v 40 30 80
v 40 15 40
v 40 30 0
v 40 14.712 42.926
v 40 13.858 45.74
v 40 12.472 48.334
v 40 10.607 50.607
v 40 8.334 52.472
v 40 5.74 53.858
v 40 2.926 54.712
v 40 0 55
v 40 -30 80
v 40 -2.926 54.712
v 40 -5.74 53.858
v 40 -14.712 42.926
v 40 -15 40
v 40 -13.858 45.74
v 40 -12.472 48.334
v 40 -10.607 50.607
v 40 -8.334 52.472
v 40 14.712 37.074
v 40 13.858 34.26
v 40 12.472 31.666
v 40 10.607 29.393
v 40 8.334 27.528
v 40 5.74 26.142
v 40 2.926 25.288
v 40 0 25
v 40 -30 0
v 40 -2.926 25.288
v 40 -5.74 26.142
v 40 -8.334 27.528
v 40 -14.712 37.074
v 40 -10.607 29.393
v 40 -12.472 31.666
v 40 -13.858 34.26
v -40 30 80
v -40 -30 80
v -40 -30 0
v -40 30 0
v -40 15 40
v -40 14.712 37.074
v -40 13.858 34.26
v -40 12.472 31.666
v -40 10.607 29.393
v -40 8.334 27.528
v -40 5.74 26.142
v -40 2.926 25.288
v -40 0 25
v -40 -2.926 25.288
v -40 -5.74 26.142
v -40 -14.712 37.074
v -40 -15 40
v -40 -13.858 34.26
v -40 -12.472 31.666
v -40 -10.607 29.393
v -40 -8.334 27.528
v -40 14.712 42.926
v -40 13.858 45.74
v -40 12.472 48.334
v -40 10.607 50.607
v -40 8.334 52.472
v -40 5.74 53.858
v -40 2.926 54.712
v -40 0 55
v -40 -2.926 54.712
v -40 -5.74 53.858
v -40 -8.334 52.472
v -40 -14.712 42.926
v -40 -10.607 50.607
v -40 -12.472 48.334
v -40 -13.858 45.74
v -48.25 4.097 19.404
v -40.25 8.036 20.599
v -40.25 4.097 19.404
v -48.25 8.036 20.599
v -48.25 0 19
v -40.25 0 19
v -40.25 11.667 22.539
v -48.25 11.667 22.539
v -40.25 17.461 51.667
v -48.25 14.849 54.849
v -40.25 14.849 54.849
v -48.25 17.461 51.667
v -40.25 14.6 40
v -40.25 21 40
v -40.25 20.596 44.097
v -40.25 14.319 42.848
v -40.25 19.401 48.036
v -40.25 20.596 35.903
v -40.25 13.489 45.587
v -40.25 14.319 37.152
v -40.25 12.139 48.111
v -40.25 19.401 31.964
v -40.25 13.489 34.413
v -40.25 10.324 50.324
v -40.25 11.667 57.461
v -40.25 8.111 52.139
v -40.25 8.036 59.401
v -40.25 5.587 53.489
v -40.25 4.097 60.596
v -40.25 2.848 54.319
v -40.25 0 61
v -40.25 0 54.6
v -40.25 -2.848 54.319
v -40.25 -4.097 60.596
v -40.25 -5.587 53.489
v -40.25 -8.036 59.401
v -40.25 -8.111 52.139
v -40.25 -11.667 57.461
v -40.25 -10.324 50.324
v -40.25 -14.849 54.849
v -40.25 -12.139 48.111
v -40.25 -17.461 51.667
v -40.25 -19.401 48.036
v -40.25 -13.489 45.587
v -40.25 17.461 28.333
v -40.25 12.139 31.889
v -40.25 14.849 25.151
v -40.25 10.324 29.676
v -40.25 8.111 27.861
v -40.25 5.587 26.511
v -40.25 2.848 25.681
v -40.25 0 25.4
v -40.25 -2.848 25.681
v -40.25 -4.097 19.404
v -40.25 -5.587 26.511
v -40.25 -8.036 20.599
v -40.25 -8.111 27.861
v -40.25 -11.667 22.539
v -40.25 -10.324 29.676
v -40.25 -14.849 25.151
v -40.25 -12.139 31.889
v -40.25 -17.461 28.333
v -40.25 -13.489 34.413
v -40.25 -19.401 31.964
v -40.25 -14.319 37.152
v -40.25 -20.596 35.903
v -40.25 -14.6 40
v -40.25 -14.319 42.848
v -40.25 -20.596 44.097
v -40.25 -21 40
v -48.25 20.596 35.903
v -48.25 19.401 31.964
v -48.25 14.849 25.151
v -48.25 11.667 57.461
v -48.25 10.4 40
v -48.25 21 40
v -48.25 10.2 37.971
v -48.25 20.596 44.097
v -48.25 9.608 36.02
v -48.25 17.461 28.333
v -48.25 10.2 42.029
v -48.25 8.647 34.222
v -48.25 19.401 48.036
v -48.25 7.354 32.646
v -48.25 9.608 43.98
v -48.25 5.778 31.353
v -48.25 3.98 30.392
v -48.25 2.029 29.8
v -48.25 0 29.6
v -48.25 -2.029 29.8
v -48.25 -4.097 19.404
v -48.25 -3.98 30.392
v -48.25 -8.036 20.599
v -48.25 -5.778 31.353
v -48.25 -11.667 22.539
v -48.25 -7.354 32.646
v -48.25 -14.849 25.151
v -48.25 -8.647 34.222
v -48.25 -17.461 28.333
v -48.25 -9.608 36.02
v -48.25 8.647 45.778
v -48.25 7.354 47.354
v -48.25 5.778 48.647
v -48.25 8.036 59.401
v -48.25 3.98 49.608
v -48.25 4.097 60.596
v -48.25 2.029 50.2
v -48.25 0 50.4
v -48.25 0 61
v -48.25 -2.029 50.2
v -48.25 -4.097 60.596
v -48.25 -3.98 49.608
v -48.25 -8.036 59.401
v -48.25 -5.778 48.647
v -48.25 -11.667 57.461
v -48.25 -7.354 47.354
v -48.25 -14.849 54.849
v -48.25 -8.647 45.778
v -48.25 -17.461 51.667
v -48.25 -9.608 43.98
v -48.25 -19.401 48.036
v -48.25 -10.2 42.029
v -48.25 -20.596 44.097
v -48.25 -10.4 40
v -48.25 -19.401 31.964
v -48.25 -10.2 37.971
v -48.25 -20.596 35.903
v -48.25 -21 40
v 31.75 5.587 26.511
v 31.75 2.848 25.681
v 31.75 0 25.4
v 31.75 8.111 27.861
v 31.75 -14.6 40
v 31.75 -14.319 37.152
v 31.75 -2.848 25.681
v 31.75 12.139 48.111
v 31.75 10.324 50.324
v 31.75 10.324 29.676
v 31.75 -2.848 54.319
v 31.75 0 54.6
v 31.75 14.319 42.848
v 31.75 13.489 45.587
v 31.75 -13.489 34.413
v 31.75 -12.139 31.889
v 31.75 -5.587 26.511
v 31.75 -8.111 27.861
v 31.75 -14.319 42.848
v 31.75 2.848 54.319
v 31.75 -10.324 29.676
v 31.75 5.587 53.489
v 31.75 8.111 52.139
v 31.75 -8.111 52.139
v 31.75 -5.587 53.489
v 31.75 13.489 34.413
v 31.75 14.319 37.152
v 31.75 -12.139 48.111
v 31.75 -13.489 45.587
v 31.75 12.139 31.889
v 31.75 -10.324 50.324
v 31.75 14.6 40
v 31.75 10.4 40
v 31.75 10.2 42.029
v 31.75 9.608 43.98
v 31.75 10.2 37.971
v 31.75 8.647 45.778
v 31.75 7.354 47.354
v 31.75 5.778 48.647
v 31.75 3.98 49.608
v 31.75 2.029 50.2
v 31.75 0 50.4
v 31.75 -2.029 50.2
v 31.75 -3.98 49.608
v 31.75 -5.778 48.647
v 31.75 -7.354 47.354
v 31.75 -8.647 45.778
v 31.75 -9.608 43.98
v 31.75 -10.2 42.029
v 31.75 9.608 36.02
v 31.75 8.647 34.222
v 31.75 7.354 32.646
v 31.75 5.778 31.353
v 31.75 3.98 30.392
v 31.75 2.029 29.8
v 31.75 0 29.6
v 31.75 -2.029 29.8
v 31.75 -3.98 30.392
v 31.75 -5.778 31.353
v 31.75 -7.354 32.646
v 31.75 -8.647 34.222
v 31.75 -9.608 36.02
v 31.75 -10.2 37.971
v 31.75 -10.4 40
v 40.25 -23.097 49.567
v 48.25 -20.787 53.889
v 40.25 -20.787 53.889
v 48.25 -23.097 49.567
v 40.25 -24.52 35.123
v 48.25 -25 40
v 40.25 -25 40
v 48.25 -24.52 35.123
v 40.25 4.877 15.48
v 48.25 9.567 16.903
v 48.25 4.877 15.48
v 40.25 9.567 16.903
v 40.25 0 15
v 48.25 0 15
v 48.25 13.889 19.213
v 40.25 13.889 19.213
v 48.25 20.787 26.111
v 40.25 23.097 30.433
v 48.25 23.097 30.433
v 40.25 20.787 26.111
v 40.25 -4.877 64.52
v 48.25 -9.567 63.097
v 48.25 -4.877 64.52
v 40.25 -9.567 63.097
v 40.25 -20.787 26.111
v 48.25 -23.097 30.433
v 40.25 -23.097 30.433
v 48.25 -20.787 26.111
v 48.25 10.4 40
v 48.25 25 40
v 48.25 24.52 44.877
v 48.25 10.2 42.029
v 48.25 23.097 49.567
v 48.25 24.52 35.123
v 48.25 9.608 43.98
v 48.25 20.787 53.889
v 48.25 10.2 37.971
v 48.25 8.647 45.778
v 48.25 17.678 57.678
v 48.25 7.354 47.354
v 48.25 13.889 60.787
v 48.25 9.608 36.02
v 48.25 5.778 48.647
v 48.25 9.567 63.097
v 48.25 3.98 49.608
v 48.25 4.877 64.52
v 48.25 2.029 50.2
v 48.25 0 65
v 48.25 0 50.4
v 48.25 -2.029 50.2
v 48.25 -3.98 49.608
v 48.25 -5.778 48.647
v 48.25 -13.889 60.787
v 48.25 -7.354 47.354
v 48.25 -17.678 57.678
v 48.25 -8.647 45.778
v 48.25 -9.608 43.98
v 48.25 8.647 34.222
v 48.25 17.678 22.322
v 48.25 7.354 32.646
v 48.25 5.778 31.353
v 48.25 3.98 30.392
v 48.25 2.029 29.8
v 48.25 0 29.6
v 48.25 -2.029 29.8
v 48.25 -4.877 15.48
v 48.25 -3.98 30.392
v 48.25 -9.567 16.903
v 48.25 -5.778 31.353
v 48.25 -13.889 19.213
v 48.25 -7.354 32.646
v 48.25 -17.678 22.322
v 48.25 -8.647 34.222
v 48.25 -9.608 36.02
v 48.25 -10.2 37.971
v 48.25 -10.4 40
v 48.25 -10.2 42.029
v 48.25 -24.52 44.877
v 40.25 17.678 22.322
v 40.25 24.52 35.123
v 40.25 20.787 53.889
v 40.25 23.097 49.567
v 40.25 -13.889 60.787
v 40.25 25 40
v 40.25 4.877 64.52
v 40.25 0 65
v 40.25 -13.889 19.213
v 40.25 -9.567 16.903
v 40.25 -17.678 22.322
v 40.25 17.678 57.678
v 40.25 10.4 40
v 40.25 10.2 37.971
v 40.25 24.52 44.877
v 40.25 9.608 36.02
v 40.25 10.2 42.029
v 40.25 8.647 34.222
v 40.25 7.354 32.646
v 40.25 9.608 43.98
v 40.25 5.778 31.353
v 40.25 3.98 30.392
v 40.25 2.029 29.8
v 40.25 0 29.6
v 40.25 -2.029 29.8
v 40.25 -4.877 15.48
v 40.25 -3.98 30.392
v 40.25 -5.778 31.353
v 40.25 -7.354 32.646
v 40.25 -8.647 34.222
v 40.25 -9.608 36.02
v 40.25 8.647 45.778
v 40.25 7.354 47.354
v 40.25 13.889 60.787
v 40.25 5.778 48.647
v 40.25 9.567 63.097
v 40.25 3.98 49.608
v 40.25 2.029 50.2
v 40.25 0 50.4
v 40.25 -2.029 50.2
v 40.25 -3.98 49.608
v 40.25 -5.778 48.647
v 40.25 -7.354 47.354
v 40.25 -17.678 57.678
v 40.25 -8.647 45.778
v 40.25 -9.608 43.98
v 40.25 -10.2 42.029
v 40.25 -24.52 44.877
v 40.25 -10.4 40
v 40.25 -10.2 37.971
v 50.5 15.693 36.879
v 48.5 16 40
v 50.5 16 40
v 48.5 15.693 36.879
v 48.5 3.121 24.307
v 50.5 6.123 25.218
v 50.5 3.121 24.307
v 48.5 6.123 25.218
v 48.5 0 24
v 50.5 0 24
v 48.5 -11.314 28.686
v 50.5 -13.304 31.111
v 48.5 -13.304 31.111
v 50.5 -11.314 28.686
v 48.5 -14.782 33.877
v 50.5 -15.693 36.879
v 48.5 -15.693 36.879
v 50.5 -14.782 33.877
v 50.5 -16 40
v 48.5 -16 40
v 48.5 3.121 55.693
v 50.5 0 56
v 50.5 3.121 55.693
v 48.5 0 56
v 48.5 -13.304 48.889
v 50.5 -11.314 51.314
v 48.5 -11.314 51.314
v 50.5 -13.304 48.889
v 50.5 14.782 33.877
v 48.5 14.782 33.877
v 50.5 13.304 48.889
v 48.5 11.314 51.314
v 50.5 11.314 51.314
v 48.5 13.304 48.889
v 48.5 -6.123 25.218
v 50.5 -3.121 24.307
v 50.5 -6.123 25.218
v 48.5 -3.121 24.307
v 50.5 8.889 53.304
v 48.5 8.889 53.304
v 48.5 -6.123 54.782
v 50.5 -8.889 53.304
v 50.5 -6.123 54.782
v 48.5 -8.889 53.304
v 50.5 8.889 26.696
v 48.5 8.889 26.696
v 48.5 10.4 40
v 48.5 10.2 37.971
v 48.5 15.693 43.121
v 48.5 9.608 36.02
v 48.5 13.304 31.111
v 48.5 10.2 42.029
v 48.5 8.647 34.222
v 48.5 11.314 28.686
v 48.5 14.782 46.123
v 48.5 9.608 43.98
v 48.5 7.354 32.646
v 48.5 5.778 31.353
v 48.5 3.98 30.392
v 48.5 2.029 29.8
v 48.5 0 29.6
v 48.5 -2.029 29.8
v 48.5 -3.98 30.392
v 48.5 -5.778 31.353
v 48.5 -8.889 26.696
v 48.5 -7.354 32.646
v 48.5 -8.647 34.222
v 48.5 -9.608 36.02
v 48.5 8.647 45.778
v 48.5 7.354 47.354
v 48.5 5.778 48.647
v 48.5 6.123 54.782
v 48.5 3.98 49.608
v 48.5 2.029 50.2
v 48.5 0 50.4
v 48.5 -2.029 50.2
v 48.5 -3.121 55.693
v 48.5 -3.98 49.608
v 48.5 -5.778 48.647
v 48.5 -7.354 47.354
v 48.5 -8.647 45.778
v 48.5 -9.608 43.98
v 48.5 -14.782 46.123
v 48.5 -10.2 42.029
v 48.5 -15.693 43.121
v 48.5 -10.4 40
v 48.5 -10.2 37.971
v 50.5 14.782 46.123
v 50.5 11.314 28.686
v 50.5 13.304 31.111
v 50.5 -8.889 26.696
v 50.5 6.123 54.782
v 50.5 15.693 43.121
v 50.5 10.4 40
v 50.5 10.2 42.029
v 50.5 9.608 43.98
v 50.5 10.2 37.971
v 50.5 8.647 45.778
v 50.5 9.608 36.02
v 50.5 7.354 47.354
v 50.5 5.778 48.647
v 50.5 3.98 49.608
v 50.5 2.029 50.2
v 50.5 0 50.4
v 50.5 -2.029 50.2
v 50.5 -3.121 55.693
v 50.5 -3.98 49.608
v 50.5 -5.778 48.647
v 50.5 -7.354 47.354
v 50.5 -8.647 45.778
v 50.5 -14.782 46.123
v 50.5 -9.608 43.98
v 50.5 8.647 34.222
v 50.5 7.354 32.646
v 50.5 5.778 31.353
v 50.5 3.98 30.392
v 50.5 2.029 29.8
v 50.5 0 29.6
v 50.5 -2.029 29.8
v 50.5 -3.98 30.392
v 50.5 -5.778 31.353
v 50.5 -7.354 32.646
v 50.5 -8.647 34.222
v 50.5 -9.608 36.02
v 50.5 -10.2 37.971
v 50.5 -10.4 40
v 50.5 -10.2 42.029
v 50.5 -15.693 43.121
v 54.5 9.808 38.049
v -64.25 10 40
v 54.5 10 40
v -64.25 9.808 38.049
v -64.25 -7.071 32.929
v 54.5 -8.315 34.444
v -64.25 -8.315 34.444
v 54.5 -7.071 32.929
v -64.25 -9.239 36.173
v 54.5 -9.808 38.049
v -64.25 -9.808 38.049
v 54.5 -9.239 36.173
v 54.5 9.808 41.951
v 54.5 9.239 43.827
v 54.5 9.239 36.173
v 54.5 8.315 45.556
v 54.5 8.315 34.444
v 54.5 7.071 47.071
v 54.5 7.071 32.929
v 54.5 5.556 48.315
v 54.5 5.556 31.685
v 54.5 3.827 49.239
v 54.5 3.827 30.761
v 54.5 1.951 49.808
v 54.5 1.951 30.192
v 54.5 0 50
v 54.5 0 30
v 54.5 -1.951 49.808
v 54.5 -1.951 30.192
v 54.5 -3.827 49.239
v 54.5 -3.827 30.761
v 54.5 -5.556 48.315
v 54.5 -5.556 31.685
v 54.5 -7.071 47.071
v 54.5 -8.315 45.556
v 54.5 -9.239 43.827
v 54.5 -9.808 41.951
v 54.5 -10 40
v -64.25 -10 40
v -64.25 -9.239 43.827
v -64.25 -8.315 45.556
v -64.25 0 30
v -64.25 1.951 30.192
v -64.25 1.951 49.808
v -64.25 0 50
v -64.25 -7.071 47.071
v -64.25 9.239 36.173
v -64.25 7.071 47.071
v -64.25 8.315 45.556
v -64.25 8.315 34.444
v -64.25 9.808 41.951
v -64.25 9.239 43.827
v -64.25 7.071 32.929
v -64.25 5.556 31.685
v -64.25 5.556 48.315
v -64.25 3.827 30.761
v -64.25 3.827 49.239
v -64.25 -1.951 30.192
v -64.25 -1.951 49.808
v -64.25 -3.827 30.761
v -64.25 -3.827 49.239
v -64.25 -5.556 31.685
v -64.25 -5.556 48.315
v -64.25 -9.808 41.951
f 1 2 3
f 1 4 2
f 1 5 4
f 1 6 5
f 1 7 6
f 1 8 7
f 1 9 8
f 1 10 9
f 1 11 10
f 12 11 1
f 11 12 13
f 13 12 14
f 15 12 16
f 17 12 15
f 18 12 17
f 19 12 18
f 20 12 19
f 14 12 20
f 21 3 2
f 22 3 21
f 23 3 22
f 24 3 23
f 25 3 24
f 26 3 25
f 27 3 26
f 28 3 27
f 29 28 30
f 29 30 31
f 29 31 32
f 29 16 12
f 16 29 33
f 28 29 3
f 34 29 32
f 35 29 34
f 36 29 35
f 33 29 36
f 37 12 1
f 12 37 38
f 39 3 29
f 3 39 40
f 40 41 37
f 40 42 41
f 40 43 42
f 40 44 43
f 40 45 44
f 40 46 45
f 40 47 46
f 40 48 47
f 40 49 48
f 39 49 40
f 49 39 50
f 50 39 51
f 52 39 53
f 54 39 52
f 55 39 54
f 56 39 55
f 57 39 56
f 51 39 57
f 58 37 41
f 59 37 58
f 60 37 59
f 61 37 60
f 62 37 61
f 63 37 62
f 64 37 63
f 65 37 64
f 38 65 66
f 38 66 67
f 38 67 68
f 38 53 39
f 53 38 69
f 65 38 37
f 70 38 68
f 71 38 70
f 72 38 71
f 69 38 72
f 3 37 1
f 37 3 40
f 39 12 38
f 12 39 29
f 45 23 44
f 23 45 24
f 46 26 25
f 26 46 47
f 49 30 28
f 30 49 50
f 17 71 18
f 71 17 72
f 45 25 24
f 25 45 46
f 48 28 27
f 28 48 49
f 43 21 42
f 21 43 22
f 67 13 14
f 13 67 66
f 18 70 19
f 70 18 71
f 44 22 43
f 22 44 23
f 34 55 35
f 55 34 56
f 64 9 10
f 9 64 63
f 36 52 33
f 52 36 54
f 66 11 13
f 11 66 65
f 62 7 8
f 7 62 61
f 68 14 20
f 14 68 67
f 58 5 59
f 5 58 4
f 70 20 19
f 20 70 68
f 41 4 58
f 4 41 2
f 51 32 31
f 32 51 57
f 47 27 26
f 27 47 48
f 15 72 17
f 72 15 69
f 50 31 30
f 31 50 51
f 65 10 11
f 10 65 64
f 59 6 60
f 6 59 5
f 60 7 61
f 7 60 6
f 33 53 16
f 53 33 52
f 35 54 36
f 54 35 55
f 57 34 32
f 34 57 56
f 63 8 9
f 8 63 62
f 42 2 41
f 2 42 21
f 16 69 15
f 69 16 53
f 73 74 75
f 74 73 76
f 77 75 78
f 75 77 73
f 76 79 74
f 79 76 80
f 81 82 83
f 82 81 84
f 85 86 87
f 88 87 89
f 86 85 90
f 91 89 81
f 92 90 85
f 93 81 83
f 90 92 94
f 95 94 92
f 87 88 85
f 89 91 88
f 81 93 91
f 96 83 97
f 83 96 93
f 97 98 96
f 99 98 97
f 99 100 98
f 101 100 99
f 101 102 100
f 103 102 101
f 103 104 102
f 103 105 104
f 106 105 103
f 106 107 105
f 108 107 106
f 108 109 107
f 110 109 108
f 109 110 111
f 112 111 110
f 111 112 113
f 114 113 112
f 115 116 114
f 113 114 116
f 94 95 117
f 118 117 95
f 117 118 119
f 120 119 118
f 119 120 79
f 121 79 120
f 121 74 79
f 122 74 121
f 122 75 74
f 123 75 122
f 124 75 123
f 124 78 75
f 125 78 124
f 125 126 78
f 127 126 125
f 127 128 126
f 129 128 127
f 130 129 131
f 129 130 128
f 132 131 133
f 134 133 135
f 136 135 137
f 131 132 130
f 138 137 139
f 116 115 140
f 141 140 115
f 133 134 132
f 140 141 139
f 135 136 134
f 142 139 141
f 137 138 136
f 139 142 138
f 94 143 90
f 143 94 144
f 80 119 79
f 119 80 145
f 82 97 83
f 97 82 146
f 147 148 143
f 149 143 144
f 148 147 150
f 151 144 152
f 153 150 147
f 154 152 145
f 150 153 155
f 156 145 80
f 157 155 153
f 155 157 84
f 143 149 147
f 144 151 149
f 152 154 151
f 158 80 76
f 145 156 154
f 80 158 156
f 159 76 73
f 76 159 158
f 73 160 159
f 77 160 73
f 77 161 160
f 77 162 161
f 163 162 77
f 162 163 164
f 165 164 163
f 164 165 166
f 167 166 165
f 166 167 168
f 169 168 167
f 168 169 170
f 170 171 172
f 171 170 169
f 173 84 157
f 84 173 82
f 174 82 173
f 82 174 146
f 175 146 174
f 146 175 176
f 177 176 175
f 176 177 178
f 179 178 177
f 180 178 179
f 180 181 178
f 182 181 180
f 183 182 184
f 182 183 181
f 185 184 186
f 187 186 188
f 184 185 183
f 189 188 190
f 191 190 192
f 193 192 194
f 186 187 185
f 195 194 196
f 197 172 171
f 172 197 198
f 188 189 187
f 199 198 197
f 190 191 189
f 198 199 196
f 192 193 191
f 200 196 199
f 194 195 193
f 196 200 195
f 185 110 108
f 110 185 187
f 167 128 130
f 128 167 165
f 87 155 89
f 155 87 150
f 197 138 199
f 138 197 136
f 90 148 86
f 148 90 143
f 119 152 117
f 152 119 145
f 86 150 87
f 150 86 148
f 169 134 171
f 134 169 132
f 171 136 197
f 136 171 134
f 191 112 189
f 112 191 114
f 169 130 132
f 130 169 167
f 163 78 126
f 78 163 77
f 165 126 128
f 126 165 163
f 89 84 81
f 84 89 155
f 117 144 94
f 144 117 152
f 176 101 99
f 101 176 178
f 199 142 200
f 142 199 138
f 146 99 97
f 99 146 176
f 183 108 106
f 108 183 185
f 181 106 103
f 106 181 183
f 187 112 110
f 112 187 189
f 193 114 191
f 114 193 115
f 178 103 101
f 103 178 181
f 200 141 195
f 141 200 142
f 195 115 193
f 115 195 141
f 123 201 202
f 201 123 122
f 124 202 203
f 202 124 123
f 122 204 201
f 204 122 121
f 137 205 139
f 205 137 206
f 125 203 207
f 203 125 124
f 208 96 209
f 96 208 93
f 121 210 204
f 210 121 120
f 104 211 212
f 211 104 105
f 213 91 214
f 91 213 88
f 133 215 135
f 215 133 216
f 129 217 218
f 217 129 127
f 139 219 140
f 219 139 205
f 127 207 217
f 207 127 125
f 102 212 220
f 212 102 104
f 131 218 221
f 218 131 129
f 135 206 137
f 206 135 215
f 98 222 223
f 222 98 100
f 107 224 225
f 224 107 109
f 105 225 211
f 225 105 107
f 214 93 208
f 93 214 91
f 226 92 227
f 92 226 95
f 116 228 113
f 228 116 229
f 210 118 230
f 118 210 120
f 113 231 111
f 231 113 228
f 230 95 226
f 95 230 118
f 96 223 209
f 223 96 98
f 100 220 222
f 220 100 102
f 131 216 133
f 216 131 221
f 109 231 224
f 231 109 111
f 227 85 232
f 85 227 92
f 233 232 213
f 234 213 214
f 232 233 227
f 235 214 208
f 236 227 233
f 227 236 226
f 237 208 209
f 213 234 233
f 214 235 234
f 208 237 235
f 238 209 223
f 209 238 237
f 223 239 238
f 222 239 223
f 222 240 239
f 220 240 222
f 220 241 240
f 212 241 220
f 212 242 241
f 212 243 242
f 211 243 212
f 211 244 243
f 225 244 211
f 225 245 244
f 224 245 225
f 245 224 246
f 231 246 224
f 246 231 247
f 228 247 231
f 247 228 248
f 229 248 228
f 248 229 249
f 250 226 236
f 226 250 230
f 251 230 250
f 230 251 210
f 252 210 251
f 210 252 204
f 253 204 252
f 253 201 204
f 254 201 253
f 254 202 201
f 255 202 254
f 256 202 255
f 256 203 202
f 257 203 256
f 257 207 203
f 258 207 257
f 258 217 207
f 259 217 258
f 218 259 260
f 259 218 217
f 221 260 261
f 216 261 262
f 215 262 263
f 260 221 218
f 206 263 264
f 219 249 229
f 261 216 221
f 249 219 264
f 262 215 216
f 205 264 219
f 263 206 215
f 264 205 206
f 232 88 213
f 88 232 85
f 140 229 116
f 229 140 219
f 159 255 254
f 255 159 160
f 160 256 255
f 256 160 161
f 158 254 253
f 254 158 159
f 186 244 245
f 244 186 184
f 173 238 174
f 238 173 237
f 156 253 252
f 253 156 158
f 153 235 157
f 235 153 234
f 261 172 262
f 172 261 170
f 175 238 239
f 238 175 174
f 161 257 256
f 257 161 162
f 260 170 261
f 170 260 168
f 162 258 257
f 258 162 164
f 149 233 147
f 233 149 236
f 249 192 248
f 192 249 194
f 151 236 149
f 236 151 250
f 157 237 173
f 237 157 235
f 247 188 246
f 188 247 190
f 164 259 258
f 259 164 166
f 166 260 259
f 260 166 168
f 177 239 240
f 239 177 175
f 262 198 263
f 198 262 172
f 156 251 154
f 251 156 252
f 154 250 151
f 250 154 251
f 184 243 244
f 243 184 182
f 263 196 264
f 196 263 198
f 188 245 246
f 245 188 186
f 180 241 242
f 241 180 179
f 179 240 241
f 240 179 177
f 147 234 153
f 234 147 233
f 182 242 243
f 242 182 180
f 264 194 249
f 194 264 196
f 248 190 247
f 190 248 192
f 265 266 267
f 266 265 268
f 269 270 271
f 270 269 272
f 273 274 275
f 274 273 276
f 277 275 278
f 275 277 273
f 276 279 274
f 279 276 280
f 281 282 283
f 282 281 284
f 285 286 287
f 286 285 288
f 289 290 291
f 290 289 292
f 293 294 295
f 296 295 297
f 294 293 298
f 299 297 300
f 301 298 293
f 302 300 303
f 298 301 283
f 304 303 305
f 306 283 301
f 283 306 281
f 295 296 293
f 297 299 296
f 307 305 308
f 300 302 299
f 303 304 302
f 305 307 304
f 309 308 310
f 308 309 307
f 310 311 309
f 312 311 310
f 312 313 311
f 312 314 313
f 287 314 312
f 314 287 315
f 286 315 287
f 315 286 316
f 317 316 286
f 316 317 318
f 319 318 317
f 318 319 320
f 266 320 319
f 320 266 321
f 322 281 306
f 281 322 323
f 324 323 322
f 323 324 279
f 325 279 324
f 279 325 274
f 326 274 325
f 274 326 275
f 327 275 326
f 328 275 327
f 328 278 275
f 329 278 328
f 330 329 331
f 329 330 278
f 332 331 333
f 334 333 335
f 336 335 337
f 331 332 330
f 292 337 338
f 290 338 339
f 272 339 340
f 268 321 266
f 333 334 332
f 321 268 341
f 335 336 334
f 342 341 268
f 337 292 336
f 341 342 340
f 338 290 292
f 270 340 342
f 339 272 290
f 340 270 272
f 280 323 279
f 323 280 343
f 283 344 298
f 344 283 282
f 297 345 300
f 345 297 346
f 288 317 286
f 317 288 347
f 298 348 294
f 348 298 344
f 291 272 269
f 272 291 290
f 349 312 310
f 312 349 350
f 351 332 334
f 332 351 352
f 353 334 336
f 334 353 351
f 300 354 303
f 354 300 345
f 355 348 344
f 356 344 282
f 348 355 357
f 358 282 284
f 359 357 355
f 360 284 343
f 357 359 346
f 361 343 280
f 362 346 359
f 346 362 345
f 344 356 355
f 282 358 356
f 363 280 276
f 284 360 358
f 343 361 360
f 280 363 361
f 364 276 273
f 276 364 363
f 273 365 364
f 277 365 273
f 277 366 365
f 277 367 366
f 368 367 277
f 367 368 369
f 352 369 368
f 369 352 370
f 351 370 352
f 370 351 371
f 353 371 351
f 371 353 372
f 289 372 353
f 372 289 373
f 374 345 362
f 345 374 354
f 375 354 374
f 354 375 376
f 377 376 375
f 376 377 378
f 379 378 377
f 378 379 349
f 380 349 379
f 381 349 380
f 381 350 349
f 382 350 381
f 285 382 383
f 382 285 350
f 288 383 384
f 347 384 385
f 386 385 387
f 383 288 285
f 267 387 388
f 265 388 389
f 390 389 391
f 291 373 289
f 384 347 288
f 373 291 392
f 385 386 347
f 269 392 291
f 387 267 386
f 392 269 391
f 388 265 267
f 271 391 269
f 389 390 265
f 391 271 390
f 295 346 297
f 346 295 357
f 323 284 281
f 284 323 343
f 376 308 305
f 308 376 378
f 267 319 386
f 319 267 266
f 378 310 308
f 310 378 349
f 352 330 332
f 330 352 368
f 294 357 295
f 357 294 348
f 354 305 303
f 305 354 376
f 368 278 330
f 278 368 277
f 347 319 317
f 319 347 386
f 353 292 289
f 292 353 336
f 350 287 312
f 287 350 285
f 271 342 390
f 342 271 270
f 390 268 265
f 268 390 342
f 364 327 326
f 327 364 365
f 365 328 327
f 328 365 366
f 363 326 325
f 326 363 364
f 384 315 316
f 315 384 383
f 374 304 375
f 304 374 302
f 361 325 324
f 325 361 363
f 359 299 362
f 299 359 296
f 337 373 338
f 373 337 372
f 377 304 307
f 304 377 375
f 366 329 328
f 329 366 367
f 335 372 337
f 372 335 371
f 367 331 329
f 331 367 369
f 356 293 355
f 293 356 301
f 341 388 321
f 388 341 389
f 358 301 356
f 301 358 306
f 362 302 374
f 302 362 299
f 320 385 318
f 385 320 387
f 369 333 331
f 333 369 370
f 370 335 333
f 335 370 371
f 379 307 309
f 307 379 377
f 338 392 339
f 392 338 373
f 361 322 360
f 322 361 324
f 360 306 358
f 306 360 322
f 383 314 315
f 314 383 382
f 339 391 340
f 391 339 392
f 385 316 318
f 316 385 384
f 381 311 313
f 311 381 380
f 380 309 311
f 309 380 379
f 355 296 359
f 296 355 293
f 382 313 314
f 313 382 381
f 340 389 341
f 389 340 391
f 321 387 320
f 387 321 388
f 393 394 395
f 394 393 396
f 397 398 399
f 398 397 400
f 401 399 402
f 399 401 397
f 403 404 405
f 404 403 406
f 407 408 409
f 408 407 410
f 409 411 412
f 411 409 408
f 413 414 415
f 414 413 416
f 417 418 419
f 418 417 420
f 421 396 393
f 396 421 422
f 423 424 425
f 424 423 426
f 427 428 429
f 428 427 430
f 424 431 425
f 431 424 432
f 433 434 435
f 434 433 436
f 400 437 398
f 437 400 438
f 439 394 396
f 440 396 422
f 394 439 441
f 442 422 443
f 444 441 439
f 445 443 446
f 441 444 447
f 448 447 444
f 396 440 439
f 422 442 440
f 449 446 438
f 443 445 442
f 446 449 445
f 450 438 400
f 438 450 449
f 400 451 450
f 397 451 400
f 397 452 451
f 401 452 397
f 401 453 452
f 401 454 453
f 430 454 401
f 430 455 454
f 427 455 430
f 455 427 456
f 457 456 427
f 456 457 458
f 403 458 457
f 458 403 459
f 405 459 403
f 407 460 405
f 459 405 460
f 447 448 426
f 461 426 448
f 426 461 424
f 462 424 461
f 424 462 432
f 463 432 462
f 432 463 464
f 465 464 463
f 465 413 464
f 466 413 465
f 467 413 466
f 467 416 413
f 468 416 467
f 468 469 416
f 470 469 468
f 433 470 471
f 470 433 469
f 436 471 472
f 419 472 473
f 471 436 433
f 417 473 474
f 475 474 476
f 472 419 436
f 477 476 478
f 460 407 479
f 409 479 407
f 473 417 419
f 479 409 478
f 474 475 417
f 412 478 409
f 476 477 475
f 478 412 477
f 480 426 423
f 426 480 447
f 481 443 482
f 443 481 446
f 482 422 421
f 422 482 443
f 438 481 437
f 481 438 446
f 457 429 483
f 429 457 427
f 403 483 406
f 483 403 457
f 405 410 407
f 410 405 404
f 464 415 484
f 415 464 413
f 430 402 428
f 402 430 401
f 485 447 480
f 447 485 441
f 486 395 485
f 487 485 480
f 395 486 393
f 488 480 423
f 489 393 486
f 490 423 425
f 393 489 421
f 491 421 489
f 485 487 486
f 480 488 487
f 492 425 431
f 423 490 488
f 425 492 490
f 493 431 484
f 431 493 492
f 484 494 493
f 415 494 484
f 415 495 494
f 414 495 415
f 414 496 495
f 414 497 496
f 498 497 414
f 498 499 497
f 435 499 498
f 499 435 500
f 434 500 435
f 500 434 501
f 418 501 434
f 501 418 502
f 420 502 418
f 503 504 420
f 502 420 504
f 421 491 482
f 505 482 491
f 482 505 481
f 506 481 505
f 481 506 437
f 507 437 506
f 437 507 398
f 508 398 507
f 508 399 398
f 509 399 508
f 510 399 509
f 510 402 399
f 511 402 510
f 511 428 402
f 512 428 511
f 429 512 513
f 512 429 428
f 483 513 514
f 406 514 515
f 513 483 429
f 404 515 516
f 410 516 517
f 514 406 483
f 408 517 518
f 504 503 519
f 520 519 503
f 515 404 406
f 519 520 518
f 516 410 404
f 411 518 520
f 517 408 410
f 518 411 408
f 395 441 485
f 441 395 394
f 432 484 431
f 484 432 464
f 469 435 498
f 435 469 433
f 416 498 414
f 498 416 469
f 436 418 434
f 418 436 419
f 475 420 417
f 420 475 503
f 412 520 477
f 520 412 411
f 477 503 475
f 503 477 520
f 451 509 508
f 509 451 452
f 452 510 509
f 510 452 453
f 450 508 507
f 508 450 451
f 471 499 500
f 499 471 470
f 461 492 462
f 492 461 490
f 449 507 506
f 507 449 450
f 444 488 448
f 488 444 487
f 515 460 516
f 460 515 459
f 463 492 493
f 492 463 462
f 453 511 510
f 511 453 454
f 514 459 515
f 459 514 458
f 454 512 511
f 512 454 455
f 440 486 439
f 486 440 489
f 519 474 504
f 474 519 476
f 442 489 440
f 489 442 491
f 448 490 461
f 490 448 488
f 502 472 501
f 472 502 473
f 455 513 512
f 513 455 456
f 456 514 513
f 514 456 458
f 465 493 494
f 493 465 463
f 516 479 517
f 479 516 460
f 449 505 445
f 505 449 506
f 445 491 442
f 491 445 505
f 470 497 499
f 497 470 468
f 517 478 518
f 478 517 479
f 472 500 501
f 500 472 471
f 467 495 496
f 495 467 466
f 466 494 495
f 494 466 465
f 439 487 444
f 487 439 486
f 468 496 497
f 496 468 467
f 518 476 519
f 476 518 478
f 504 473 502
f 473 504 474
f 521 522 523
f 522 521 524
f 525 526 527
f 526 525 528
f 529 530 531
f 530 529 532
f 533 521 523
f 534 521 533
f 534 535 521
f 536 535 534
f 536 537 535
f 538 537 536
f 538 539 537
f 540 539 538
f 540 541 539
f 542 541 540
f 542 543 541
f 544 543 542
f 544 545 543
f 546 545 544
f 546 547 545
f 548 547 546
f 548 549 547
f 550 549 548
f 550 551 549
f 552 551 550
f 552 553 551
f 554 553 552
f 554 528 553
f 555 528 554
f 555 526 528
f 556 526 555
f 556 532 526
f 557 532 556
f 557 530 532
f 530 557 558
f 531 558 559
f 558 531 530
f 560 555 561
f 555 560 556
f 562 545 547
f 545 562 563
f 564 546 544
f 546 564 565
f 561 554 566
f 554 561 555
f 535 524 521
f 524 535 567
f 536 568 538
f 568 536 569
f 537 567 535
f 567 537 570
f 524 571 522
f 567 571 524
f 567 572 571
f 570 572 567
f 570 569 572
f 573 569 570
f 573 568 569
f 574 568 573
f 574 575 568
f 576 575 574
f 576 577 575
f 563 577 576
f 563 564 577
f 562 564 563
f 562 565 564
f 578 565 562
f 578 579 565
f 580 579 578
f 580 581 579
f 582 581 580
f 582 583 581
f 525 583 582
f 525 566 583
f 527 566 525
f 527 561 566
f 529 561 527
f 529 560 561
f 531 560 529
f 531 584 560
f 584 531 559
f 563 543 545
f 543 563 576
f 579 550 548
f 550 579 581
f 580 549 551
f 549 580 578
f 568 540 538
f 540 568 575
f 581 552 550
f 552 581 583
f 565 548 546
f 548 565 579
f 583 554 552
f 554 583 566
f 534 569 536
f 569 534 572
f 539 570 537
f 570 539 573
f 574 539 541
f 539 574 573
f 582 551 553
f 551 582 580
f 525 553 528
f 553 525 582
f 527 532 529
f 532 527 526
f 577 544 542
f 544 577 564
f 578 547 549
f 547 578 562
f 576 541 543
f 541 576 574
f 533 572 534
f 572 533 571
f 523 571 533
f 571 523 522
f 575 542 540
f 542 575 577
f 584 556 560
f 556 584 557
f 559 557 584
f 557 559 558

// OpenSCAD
$fn = 32;

// ------------------------------------------------------------------------
// Bushed housing: 80 x 60 x 80 mm housing, bushing d29.2
// Every part is its own module, assembly() places them once.
// ------------------------------------------------------------------------

// --- part 1 ---
module housing() {
  difference() {
    translate([-40, -30, 0]) cube([80, 60, 80]);
    translate([0, 0, 40]) rotate([0, 90, 0]) cylinder(h = 82, d = 30, center = true);
  }
}

// --- part 2 ---
module bushing() {
  difference() {
    union() {
      cylinder(h = 8, d = 42);
      translate([0, 0, 8]) cylinder(h = 72, d = 29.2);
    }
    translate([0, 0, -1]) cylinder(h = 82, d = 20.8);
  }
}

// --- part 3 ---
module shaft() {
  translate([0, 0, -59.375]) cylinder(h = 118.75, d = 20);
}

// --- part 4 ---
module cover() {
  difference() {
    cylinder(h = 8, d = 50);
    translate([0, 0, -1]) cylinder(h = 10, d = 20.8);
  }
}

// --- part 5 ---
module washer() {
  difference() {
      translate([0, 0, 0]) cylinder(h = 2, d = 32);
      translate([0, 0, -1]) cylinder(h = 4, d = 20.8);
    }
}

// --- assembly ---
module assembly() {
  translate([0, 0, 0]) rotate([0, 0, 0]) housing();
  translate([-48.25, 0, 40]) rotate([0, 90, 0]) bushing();
  translate([-4.875, 0, 40]) rotate([0, 90, 0]) shaft();
  translate([40.25, 0, 40]) rotate([0, 90, 0]) cover();
  translate([48.5, 0, 40]) rotate([0, 90, 0]) washer();
}

assembly();
